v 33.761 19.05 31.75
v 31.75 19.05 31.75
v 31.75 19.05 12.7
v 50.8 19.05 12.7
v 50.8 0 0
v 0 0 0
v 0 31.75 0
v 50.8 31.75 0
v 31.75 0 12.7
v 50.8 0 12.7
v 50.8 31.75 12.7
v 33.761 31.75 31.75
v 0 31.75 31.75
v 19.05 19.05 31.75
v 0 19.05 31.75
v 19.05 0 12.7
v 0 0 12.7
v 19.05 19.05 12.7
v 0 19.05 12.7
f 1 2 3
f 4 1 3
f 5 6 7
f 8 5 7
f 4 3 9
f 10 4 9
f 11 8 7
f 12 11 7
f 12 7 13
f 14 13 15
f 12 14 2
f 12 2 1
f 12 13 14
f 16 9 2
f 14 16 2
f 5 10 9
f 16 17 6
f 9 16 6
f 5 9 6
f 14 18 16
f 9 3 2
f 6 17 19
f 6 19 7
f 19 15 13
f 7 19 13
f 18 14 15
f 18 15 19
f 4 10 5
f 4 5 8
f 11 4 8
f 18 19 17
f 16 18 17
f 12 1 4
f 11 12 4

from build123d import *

# Parameters (mm, degrees)
F1_DEPTH = 50.8
F3_DEPTH = 12.7
F4_W     = 12.7
F4_H     = 19.05
F5_DEPTH = 19.05
F7_DEPTH = 12.7


with BuildPart() as f1:
    # F0 (on Right) → F1 (new body)
    with BuildSketch(Plane.YZ):
        Polygon((0, 12.7), (0, 0), (31.75, 0), (31.75, 31.75), (19.05, 31.75), (19.05, 12.7), align=None)
    extrude(amount=F1_DEPTH)

    # F2 (on face) → F3 (cut)
    with BuildSketch(Plane.XZ.offset(-19.05)):
        Polygon((50.8, 31.75), (33.761162, 31.75), (50.8, 12.7), align=None)
    extrude(amount=-F3_DEPTH, mode=Mode.SUBTRACT)

    # F4 (on face) → F5 (join)
    with BuildSketch(Plane.XZ.offset(-19.05)):
        with Locations((25.4, 22.225)):
            Rectangle(F4_W, F4_H)
    extrude(amount=F5_DEPTH)

    # F6 (on face) → F7 (cut)
    with BuildSketch(Plane.YZ.offset(31.75)):
        Polygon((0, 12.7), (19.05, 31.75), (0, 31.75), align=None)
    extrude(amount=-F7_DEPTH, mode=Mode.SUBTRACT)


solid = f1.part
